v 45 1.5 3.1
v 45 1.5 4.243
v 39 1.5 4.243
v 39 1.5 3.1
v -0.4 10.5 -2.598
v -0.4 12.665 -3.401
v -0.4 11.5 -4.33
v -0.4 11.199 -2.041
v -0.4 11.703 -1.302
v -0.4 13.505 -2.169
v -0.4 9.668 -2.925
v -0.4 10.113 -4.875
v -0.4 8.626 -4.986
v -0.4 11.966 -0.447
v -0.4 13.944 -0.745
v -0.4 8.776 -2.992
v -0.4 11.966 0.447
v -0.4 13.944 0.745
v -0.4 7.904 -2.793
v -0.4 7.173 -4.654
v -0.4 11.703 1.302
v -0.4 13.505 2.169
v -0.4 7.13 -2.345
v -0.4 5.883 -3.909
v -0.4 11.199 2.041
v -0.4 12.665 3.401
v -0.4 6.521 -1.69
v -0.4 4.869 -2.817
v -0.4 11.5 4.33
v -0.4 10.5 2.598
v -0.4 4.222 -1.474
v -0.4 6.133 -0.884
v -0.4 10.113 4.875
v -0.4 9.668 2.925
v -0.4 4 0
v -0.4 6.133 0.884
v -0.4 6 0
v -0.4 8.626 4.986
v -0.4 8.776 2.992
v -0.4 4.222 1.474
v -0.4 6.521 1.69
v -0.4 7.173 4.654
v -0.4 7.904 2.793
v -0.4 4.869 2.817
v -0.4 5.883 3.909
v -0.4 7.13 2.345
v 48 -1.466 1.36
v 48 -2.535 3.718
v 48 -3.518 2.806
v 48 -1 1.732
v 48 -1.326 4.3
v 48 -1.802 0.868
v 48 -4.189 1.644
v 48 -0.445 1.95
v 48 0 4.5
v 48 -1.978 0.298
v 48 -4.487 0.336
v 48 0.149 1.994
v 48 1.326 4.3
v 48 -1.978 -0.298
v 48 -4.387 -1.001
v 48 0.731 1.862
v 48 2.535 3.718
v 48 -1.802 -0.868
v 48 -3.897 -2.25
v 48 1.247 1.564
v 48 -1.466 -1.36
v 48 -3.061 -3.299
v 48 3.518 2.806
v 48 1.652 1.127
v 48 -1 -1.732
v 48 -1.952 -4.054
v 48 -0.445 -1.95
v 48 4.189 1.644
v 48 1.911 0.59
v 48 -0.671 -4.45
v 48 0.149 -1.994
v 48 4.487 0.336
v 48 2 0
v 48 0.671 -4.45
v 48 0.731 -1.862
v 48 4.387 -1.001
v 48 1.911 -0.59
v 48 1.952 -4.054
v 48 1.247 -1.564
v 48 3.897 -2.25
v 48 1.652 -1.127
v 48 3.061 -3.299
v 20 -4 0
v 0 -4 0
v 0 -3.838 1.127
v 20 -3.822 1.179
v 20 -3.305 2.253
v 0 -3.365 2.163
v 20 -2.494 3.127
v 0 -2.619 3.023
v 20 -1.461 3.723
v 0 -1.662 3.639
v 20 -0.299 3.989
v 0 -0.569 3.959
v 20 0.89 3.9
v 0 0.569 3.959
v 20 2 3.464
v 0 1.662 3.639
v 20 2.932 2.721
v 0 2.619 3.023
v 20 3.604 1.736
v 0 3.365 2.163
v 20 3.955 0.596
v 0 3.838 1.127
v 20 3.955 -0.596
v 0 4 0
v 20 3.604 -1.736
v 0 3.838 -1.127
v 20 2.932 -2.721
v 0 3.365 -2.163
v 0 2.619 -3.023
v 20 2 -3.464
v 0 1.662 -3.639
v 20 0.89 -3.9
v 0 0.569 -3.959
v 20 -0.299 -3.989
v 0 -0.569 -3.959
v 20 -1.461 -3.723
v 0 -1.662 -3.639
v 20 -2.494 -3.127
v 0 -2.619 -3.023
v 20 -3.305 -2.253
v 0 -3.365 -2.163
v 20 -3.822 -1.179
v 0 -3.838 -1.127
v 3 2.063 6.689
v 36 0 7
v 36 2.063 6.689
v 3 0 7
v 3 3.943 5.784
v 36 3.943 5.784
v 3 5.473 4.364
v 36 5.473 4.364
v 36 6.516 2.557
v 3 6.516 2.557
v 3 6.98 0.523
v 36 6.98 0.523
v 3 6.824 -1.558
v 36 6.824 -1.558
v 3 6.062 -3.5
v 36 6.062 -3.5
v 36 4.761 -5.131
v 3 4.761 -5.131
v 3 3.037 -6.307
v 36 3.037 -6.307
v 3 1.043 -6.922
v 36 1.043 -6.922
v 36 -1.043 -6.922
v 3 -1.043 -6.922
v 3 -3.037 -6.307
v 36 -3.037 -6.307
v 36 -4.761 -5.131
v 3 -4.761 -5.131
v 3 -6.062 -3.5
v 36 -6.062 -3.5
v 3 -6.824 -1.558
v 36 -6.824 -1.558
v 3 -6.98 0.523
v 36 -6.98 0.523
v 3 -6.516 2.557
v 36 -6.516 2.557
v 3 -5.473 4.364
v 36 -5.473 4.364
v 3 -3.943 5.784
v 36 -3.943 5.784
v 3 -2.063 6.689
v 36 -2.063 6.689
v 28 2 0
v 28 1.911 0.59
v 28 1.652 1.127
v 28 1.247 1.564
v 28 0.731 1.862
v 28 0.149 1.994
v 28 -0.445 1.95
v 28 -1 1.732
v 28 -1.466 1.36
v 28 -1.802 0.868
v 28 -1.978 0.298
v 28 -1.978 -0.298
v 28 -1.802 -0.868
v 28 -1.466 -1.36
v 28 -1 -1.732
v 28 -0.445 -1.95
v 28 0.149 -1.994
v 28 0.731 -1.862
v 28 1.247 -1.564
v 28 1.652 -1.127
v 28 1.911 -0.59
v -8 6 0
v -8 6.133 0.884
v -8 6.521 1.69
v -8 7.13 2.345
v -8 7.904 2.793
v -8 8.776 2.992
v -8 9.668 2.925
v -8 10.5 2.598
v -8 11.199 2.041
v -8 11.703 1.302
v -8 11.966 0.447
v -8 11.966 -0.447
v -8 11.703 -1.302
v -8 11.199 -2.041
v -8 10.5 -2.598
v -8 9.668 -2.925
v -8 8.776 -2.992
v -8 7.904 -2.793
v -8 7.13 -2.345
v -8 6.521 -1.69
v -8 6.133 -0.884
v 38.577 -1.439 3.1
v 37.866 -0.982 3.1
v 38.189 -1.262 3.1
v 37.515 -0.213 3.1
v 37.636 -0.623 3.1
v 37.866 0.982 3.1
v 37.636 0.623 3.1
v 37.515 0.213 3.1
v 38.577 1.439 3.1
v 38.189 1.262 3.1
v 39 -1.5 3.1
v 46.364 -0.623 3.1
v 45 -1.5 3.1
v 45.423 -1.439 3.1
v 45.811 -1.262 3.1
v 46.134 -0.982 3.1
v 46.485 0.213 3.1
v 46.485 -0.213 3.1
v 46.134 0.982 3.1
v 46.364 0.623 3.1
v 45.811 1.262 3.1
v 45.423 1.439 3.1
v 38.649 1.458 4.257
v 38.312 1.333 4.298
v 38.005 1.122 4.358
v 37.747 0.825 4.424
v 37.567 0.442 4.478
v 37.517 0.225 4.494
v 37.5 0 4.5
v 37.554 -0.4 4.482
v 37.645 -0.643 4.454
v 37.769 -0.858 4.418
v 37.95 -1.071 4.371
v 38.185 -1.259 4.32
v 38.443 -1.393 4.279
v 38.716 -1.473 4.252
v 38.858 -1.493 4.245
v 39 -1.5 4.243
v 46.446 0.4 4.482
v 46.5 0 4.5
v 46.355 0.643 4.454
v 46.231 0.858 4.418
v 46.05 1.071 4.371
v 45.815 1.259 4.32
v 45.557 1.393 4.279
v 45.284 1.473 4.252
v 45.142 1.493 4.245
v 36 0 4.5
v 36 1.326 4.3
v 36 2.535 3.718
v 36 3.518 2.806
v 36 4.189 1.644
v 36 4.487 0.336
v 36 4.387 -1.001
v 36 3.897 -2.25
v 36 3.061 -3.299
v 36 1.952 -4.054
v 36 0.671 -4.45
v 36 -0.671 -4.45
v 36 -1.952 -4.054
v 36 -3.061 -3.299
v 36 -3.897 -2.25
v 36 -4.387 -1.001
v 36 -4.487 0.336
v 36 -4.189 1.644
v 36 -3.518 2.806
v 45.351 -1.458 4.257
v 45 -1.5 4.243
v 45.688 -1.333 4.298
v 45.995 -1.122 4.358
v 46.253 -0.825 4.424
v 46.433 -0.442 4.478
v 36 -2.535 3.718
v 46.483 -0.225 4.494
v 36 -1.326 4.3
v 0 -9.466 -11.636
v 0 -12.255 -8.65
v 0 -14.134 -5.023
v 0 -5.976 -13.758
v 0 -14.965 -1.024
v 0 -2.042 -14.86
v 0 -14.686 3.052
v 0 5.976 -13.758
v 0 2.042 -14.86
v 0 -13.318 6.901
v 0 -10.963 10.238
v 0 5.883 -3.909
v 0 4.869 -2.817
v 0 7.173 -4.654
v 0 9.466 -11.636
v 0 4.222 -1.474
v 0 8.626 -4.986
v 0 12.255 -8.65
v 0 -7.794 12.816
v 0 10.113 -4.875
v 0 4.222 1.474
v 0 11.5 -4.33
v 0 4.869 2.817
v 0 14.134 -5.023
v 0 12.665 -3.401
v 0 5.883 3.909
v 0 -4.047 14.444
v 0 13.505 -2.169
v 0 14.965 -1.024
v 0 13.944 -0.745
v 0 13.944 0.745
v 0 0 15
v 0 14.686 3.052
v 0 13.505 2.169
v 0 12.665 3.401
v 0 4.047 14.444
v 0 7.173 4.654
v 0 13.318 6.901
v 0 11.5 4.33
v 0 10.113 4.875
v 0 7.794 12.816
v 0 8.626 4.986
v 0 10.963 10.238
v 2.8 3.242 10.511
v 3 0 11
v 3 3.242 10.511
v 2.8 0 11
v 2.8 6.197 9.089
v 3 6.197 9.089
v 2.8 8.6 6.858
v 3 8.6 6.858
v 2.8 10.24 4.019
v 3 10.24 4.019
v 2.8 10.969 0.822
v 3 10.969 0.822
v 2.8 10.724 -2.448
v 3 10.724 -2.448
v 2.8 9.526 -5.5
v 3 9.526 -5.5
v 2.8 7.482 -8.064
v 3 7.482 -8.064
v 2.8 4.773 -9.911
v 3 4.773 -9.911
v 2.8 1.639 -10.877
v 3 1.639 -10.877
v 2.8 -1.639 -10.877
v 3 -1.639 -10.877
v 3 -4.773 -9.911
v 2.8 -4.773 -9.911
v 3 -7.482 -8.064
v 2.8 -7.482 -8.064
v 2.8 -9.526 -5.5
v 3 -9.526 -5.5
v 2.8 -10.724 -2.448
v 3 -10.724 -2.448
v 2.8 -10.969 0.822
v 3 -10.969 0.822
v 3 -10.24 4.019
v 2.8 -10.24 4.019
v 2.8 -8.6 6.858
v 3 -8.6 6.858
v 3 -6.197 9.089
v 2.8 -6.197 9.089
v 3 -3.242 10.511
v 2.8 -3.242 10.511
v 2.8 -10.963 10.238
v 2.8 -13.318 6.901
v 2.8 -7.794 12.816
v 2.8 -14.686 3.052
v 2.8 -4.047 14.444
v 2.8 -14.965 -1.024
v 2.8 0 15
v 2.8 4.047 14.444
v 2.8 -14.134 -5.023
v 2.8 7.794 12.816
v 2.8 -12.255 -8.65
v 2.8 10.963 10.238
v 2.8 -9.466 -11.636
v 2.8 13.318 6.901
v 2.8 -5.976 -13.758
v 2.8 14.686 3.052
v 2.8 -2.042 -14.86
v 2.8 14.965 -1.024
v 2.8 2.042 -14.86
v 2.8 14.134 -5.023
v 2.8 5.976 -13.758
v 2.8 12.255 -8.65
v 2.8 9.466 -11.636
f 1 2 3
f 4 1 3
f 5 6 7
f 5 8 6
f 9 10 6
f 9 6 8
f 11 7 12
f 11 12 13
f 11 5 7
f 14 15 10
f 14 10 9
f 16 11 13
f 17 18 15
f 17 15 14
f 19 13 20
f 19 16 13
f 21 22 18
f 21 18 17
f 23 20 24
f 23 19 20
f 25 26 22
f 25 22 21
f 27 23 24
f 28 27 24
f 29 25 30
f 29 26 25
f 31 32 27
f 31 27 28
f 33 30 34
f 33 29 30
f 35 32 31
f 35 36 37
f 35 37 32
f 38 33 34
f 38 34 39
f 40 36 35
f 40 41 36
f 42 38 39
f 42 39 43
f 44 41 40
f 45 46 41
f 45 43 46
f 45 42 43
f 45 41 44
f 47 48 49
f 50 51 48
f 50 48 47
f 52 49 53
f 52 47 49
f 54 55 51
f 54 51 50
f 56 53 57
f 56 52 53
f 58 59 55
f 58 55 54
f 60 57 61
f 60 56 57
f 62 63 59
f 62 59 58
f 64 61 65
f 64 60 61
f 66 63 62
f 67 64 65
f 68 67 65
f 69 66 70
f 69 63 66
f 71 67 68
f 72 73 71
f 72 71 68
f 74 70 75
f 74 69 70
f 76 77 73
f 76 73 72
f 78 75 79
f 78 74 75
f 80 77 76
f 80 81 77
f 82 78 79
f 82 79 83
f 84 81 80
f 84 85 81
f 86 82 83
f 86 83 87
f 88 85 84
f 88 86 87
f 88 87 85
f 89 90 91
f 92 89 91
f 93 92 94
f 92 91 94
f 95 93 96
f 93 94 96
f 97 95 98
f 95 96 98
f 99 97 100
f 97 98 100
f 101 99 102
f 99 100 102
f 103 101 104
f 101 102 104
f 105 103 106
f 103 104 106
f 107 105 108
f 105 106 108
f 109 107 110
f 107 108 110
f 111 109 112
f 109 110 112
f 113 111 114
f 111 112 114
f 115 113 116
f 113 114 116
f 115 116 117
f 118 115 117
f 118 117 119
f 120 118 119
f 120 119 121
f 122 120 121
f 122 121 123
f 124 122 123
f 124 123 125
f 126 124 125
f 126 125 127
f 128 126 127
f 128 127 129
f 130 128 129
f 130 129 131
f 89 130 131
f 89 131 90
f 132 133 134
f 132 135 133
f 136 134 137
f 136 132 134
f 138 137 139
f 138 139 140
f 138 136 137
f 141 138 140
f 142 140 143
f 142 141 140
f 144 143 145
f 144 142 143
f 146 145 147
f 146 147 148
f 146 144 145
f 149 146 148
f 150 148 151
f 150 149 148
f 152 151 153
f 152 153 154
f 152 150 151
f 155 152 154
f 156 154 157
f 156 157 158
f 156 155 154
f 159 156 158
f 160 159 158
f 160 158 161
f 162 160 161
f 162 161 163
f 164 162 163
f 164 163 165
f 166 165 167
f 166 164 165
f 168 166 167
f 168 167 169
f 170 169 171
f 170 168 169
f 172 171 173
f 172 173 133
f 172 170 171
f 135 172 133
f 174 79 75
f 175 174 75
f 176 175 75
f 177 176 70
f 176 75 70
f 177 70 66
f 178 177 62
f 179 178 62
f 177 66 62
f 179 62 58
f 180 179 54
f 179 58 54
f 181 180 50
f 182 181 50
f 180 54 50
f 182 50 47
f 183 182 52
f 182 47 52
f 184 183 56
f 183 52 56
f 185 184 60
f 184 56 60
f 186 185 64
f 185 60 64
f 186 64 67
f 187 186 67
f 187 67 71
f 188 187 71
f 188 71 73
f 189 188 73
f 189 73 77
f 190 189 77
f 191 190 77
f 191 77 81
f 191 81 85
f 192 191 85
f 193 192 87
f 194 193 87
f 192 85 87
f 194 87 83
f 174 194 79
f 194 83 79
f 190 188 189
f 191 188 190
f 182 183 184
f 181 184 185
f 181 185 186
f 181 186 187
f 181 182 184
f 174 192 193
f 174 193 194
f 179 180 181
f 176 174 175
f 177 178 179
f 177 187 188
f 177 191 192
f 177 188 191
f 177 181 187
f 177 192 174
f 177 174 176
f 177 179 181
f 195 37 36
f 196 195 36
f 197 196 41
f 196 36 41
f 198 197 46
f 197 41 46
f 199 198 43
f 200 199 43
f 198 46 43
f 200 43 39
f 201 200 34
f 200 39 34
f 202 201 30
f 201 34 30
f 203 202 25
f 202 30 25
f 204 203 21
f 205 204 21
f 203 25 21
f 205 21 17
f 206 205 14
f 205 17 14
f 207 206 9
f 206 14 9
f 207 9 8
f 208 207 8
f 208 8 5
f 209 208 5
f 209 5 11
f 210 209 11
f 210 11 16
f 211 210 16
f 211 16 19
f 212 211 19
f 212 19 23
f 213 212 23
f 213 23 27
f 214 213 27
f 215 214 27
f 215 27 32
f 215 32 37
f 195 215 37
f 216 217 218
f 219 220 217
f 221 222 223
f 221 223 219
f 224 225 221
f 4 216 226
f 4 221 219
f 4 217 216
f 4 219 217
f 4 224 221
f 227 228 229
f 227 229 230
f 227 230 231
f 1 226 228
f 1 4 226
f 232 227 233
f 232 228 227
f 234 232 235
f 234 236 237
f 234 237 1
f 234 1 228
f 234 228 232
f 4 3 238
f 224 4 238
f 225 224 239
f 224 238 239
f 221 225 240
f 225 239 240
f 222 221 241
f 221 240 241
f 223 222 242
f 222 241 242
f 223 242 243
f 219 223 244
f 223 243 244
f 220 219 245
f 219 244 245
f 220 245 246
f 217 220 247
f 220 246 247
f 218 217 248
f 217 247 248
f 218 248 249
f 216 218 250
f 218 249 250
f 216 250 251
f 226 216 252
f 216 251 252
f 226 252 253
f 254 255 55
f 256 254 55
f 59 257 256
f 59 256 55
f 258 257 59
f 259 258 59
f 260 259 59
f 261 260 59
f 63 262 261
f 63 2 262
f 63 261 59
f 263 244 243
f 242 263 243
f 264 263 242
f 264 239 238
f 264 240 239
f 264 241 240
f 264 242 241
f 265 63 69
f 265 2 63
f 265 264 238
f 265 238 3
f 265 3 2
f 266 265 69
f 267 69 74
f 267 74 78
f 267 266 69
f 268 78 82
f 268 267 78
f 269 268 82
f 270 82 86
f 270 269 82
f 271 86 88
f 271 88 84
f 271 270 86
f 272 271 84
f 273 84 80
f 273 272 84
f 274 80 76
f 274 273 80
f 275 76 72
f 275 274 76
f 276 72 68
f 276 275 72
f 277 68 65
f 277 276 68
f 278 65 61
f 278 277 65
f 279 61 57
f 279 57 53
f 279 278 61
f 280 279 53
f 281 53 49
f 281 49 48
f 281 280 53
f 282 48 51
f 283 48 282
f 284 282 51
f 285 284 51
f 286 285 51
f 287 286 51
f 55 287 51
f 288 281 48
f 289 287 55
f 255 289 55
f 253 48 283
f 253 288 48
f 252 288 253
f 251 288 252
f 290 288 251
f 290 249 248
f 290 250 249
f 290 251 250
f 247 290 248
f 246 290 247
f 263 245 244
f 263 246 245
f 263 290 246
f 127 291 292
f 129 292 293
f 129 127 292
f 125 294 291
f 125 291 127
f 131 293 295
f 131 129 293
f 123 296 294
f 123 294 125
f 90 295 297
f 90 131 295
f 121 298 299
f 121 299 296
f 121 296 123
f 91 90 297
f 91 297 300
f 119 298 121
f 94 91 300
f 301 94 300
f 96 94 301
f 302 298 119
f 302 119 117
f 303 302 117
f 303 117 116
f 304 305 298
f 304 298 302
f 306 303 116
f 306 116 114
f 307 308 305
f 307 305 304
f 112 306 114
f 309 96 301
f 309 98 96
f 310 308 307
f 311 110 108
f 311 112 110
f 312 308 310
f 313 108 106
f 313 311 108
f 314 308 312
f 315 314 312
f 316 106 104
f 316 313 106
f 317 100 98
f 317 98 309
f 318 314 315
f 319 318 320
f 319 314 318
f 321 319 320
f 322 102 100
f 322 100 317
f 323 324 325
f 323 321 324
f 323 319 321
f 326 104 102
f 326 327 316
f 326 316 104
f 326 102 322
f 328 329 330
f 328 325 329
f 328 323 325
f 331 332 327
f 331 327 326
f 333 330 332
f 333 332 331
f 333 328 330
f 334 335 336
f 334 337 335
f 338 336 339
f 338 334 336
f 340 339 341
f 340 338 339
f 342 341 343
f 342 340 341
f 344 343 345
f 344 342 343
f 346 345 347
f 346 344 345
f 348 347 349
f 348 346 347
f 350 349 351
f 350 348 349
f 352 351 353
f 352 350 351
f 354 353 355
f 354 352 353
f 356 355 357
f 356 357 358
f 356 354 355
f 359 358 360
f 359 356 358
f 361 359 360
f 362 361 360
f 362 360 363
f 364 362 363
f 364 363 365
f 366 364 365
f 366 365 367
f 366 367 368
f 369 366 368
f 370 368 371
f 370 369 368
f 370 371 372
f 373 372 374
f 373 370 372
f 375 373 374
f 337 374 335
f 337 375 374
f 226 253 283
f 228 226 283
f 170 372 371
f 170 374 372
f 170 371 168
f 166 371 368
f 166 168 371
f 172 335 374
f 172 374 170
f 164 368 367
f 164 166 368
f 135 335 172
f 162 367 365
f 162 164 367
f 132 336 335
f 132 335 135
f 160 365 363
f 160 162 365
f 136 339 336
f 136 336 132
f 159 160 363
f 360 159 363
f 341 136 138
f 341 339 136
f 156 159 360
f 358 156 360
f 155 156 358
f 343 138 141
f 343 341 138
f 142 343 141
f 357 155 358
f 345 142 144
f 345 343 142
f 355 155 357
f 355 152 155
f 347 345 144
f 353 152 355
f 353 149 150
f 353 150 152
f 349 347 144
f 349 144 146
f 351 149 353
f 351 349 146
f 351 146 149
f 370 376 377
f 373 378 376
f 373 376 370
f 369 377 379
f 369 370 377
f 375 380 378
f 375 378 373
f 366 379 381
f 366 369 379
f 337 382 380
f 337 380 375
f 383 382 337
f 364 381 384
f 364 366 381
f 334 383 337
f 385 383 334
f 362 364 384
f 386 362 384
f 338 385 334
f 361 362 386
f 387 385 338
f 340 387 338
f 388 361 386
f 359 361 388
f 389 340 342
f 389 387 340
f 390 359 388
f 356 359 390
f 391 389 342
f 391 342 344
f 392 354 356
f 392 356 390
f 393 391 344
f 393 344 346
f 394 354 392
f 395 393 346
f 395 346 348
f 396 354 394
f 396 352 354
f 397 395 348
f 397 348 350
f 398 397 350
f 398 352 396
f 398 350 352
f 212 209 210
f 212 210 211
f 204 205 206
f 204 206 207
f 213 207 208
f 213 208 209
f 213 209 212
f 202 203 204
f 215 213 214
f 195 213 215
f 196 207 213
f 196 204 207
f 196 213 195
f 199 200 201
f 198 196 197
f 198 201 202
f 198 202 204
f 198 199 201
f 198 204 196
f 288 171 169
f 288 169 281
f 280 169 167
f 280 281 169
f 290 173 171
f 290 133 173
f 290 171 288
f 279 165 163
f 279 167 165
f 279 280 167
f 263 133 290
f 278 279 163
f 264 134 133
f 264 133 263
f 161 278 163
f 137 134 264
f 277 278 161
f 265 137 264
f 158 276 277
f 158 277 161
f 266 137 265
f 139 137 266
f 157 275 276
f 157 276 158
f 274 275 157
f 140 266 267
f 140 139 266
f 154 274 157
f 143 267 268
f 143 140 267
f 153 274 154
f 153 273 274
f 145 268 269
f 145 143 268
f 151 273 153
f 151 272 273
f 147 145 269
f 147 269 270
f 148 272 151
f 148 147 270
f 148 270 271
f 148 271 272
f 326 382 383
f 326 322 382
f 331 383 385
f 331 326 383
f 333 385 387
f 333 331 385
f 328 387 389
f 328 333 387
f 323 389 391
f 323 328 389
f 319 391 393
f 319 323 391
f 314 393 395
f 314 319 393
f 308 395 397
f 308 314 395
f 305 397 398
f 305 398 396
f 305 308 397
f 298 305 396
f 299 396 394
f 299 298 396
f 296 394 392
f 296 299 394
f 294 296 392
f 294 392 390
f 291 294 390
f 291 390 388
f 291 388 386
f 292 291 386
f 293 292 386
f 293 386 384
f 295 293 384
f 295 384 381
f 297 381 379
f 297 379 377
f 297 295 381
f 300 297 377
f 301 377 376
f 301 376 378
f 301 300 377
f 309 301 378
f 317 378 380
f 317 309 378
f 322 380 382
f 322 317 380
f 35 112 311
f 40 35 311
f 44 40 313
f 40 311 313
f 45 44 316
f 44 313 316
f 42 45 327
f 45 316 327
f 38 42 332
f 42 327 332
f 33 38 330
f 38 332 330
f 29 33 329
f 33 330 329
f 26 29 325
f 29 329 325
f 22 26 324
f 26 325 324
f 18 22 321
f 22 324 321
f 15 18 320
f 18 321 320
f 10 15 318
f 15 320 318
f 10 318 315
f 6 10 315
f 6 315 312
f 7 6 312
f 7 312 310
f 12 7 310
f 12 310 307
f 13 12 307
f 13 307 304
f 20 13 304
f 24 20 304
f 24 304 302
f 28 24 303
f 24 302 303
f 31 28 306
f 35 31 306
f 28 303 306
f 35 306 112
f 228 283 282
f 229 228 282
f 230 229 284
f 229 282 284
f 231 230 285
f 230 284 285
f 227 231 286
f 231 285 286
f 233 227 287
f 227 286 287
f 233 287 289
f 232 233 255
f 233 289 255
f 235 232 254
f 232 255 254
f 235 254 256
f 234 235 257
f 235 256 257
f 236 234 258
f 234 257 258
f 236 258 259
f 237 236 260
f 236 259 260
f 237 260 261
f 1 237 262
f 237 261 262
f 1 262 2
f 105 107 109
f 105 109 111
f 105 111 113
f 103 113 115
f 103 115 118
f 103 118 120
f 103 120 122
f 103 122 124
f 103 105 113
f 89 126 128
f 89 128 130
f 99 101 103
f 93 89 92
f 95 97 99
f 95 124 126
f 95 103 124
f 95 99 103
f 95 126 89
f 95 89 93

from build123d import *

# Parameters (mm, degrees)
F2_R      = 2
F3_DEPTH  = 20
F4_R      = 4
F5_DEPTH  = 20
F8_DEPTH  = 1.4
F9_R      = 3
F10_DEPTH = 8
F9_R_2    = 5
F11_DEPTH = 0.4


with BuildPart() as f1:
    # F0 (on Front) → F1 (revolve)
    with BuildSketch(Plane.XZ):
        Polygon((0, 15), (0, 0), (48, 0), (48, 4.5), (36, 4.5), (36, 7), (3, 7), (3, 11), (2.8, 11), (2.8, 15), align=None)
    revolve(axis=Axis((24, 0, 0), (-1, 0, 0)))

    # F2 (on face) → F3 (cut)
    with BuildSketch(Plane.YZ.offset(48)):
        Circle(F2_R)
    extrude(amount=-F3_DEPTH, mode=Mode.SUBTRACT)

    # F4 (on face) → F5 (cut)
    with BuildSketch(Plane(origin=(0, 0, 0), x_dir=(0, -1, 0), z_dir=(-1, 0, 0))):
        Circle(F4_R)
    extrude(amount=-F5_DEPTH, mode=Mode.SUBTRACT)

    # F7 (on offset) → F8 (cut)
    with BuildSketch(Plane.XY.offset(4.5)):
        with BuildLine():
            ThreePointArc((39, 1.5), (37.5, 0), (39, -1.5))
            Line((39, -1.5), (45, -1.5))
            ThreePointArc((45, -1.5), (46.5, 0), (45, 1.5))
            Line((45, 1.5), (39, 1.5))
        make_face()
    extrude(amount=-F8_DEPTH, mode=Mode.SUBTRACT)

    # F9 (on face) → F10 (join)
    with BuildSketch(Plane(origin=(0, 0, 0), x_dir=(0, -1, 0), z_dir=(-1, 0, 0))):
        with Locations((-9, 0)):
            Circle(F9_R)
    extrude(amount=F10_DEPTH)

    # F9 (on face) → F11 (join)
    with BuildSketch(Plane(origin=(0, 0, 0), x_dir=(0, -1, 0), z_dir=(-1, 0, 0))):
        with Locations((-9, 0)):
            Circle(F9_R_2)
        with Locations((-9, 0)):
            Circle(F9_R, mode=Mode.SUBTRACT)
    extrude(amount=F11_DEPTH)


solid = f1.part
